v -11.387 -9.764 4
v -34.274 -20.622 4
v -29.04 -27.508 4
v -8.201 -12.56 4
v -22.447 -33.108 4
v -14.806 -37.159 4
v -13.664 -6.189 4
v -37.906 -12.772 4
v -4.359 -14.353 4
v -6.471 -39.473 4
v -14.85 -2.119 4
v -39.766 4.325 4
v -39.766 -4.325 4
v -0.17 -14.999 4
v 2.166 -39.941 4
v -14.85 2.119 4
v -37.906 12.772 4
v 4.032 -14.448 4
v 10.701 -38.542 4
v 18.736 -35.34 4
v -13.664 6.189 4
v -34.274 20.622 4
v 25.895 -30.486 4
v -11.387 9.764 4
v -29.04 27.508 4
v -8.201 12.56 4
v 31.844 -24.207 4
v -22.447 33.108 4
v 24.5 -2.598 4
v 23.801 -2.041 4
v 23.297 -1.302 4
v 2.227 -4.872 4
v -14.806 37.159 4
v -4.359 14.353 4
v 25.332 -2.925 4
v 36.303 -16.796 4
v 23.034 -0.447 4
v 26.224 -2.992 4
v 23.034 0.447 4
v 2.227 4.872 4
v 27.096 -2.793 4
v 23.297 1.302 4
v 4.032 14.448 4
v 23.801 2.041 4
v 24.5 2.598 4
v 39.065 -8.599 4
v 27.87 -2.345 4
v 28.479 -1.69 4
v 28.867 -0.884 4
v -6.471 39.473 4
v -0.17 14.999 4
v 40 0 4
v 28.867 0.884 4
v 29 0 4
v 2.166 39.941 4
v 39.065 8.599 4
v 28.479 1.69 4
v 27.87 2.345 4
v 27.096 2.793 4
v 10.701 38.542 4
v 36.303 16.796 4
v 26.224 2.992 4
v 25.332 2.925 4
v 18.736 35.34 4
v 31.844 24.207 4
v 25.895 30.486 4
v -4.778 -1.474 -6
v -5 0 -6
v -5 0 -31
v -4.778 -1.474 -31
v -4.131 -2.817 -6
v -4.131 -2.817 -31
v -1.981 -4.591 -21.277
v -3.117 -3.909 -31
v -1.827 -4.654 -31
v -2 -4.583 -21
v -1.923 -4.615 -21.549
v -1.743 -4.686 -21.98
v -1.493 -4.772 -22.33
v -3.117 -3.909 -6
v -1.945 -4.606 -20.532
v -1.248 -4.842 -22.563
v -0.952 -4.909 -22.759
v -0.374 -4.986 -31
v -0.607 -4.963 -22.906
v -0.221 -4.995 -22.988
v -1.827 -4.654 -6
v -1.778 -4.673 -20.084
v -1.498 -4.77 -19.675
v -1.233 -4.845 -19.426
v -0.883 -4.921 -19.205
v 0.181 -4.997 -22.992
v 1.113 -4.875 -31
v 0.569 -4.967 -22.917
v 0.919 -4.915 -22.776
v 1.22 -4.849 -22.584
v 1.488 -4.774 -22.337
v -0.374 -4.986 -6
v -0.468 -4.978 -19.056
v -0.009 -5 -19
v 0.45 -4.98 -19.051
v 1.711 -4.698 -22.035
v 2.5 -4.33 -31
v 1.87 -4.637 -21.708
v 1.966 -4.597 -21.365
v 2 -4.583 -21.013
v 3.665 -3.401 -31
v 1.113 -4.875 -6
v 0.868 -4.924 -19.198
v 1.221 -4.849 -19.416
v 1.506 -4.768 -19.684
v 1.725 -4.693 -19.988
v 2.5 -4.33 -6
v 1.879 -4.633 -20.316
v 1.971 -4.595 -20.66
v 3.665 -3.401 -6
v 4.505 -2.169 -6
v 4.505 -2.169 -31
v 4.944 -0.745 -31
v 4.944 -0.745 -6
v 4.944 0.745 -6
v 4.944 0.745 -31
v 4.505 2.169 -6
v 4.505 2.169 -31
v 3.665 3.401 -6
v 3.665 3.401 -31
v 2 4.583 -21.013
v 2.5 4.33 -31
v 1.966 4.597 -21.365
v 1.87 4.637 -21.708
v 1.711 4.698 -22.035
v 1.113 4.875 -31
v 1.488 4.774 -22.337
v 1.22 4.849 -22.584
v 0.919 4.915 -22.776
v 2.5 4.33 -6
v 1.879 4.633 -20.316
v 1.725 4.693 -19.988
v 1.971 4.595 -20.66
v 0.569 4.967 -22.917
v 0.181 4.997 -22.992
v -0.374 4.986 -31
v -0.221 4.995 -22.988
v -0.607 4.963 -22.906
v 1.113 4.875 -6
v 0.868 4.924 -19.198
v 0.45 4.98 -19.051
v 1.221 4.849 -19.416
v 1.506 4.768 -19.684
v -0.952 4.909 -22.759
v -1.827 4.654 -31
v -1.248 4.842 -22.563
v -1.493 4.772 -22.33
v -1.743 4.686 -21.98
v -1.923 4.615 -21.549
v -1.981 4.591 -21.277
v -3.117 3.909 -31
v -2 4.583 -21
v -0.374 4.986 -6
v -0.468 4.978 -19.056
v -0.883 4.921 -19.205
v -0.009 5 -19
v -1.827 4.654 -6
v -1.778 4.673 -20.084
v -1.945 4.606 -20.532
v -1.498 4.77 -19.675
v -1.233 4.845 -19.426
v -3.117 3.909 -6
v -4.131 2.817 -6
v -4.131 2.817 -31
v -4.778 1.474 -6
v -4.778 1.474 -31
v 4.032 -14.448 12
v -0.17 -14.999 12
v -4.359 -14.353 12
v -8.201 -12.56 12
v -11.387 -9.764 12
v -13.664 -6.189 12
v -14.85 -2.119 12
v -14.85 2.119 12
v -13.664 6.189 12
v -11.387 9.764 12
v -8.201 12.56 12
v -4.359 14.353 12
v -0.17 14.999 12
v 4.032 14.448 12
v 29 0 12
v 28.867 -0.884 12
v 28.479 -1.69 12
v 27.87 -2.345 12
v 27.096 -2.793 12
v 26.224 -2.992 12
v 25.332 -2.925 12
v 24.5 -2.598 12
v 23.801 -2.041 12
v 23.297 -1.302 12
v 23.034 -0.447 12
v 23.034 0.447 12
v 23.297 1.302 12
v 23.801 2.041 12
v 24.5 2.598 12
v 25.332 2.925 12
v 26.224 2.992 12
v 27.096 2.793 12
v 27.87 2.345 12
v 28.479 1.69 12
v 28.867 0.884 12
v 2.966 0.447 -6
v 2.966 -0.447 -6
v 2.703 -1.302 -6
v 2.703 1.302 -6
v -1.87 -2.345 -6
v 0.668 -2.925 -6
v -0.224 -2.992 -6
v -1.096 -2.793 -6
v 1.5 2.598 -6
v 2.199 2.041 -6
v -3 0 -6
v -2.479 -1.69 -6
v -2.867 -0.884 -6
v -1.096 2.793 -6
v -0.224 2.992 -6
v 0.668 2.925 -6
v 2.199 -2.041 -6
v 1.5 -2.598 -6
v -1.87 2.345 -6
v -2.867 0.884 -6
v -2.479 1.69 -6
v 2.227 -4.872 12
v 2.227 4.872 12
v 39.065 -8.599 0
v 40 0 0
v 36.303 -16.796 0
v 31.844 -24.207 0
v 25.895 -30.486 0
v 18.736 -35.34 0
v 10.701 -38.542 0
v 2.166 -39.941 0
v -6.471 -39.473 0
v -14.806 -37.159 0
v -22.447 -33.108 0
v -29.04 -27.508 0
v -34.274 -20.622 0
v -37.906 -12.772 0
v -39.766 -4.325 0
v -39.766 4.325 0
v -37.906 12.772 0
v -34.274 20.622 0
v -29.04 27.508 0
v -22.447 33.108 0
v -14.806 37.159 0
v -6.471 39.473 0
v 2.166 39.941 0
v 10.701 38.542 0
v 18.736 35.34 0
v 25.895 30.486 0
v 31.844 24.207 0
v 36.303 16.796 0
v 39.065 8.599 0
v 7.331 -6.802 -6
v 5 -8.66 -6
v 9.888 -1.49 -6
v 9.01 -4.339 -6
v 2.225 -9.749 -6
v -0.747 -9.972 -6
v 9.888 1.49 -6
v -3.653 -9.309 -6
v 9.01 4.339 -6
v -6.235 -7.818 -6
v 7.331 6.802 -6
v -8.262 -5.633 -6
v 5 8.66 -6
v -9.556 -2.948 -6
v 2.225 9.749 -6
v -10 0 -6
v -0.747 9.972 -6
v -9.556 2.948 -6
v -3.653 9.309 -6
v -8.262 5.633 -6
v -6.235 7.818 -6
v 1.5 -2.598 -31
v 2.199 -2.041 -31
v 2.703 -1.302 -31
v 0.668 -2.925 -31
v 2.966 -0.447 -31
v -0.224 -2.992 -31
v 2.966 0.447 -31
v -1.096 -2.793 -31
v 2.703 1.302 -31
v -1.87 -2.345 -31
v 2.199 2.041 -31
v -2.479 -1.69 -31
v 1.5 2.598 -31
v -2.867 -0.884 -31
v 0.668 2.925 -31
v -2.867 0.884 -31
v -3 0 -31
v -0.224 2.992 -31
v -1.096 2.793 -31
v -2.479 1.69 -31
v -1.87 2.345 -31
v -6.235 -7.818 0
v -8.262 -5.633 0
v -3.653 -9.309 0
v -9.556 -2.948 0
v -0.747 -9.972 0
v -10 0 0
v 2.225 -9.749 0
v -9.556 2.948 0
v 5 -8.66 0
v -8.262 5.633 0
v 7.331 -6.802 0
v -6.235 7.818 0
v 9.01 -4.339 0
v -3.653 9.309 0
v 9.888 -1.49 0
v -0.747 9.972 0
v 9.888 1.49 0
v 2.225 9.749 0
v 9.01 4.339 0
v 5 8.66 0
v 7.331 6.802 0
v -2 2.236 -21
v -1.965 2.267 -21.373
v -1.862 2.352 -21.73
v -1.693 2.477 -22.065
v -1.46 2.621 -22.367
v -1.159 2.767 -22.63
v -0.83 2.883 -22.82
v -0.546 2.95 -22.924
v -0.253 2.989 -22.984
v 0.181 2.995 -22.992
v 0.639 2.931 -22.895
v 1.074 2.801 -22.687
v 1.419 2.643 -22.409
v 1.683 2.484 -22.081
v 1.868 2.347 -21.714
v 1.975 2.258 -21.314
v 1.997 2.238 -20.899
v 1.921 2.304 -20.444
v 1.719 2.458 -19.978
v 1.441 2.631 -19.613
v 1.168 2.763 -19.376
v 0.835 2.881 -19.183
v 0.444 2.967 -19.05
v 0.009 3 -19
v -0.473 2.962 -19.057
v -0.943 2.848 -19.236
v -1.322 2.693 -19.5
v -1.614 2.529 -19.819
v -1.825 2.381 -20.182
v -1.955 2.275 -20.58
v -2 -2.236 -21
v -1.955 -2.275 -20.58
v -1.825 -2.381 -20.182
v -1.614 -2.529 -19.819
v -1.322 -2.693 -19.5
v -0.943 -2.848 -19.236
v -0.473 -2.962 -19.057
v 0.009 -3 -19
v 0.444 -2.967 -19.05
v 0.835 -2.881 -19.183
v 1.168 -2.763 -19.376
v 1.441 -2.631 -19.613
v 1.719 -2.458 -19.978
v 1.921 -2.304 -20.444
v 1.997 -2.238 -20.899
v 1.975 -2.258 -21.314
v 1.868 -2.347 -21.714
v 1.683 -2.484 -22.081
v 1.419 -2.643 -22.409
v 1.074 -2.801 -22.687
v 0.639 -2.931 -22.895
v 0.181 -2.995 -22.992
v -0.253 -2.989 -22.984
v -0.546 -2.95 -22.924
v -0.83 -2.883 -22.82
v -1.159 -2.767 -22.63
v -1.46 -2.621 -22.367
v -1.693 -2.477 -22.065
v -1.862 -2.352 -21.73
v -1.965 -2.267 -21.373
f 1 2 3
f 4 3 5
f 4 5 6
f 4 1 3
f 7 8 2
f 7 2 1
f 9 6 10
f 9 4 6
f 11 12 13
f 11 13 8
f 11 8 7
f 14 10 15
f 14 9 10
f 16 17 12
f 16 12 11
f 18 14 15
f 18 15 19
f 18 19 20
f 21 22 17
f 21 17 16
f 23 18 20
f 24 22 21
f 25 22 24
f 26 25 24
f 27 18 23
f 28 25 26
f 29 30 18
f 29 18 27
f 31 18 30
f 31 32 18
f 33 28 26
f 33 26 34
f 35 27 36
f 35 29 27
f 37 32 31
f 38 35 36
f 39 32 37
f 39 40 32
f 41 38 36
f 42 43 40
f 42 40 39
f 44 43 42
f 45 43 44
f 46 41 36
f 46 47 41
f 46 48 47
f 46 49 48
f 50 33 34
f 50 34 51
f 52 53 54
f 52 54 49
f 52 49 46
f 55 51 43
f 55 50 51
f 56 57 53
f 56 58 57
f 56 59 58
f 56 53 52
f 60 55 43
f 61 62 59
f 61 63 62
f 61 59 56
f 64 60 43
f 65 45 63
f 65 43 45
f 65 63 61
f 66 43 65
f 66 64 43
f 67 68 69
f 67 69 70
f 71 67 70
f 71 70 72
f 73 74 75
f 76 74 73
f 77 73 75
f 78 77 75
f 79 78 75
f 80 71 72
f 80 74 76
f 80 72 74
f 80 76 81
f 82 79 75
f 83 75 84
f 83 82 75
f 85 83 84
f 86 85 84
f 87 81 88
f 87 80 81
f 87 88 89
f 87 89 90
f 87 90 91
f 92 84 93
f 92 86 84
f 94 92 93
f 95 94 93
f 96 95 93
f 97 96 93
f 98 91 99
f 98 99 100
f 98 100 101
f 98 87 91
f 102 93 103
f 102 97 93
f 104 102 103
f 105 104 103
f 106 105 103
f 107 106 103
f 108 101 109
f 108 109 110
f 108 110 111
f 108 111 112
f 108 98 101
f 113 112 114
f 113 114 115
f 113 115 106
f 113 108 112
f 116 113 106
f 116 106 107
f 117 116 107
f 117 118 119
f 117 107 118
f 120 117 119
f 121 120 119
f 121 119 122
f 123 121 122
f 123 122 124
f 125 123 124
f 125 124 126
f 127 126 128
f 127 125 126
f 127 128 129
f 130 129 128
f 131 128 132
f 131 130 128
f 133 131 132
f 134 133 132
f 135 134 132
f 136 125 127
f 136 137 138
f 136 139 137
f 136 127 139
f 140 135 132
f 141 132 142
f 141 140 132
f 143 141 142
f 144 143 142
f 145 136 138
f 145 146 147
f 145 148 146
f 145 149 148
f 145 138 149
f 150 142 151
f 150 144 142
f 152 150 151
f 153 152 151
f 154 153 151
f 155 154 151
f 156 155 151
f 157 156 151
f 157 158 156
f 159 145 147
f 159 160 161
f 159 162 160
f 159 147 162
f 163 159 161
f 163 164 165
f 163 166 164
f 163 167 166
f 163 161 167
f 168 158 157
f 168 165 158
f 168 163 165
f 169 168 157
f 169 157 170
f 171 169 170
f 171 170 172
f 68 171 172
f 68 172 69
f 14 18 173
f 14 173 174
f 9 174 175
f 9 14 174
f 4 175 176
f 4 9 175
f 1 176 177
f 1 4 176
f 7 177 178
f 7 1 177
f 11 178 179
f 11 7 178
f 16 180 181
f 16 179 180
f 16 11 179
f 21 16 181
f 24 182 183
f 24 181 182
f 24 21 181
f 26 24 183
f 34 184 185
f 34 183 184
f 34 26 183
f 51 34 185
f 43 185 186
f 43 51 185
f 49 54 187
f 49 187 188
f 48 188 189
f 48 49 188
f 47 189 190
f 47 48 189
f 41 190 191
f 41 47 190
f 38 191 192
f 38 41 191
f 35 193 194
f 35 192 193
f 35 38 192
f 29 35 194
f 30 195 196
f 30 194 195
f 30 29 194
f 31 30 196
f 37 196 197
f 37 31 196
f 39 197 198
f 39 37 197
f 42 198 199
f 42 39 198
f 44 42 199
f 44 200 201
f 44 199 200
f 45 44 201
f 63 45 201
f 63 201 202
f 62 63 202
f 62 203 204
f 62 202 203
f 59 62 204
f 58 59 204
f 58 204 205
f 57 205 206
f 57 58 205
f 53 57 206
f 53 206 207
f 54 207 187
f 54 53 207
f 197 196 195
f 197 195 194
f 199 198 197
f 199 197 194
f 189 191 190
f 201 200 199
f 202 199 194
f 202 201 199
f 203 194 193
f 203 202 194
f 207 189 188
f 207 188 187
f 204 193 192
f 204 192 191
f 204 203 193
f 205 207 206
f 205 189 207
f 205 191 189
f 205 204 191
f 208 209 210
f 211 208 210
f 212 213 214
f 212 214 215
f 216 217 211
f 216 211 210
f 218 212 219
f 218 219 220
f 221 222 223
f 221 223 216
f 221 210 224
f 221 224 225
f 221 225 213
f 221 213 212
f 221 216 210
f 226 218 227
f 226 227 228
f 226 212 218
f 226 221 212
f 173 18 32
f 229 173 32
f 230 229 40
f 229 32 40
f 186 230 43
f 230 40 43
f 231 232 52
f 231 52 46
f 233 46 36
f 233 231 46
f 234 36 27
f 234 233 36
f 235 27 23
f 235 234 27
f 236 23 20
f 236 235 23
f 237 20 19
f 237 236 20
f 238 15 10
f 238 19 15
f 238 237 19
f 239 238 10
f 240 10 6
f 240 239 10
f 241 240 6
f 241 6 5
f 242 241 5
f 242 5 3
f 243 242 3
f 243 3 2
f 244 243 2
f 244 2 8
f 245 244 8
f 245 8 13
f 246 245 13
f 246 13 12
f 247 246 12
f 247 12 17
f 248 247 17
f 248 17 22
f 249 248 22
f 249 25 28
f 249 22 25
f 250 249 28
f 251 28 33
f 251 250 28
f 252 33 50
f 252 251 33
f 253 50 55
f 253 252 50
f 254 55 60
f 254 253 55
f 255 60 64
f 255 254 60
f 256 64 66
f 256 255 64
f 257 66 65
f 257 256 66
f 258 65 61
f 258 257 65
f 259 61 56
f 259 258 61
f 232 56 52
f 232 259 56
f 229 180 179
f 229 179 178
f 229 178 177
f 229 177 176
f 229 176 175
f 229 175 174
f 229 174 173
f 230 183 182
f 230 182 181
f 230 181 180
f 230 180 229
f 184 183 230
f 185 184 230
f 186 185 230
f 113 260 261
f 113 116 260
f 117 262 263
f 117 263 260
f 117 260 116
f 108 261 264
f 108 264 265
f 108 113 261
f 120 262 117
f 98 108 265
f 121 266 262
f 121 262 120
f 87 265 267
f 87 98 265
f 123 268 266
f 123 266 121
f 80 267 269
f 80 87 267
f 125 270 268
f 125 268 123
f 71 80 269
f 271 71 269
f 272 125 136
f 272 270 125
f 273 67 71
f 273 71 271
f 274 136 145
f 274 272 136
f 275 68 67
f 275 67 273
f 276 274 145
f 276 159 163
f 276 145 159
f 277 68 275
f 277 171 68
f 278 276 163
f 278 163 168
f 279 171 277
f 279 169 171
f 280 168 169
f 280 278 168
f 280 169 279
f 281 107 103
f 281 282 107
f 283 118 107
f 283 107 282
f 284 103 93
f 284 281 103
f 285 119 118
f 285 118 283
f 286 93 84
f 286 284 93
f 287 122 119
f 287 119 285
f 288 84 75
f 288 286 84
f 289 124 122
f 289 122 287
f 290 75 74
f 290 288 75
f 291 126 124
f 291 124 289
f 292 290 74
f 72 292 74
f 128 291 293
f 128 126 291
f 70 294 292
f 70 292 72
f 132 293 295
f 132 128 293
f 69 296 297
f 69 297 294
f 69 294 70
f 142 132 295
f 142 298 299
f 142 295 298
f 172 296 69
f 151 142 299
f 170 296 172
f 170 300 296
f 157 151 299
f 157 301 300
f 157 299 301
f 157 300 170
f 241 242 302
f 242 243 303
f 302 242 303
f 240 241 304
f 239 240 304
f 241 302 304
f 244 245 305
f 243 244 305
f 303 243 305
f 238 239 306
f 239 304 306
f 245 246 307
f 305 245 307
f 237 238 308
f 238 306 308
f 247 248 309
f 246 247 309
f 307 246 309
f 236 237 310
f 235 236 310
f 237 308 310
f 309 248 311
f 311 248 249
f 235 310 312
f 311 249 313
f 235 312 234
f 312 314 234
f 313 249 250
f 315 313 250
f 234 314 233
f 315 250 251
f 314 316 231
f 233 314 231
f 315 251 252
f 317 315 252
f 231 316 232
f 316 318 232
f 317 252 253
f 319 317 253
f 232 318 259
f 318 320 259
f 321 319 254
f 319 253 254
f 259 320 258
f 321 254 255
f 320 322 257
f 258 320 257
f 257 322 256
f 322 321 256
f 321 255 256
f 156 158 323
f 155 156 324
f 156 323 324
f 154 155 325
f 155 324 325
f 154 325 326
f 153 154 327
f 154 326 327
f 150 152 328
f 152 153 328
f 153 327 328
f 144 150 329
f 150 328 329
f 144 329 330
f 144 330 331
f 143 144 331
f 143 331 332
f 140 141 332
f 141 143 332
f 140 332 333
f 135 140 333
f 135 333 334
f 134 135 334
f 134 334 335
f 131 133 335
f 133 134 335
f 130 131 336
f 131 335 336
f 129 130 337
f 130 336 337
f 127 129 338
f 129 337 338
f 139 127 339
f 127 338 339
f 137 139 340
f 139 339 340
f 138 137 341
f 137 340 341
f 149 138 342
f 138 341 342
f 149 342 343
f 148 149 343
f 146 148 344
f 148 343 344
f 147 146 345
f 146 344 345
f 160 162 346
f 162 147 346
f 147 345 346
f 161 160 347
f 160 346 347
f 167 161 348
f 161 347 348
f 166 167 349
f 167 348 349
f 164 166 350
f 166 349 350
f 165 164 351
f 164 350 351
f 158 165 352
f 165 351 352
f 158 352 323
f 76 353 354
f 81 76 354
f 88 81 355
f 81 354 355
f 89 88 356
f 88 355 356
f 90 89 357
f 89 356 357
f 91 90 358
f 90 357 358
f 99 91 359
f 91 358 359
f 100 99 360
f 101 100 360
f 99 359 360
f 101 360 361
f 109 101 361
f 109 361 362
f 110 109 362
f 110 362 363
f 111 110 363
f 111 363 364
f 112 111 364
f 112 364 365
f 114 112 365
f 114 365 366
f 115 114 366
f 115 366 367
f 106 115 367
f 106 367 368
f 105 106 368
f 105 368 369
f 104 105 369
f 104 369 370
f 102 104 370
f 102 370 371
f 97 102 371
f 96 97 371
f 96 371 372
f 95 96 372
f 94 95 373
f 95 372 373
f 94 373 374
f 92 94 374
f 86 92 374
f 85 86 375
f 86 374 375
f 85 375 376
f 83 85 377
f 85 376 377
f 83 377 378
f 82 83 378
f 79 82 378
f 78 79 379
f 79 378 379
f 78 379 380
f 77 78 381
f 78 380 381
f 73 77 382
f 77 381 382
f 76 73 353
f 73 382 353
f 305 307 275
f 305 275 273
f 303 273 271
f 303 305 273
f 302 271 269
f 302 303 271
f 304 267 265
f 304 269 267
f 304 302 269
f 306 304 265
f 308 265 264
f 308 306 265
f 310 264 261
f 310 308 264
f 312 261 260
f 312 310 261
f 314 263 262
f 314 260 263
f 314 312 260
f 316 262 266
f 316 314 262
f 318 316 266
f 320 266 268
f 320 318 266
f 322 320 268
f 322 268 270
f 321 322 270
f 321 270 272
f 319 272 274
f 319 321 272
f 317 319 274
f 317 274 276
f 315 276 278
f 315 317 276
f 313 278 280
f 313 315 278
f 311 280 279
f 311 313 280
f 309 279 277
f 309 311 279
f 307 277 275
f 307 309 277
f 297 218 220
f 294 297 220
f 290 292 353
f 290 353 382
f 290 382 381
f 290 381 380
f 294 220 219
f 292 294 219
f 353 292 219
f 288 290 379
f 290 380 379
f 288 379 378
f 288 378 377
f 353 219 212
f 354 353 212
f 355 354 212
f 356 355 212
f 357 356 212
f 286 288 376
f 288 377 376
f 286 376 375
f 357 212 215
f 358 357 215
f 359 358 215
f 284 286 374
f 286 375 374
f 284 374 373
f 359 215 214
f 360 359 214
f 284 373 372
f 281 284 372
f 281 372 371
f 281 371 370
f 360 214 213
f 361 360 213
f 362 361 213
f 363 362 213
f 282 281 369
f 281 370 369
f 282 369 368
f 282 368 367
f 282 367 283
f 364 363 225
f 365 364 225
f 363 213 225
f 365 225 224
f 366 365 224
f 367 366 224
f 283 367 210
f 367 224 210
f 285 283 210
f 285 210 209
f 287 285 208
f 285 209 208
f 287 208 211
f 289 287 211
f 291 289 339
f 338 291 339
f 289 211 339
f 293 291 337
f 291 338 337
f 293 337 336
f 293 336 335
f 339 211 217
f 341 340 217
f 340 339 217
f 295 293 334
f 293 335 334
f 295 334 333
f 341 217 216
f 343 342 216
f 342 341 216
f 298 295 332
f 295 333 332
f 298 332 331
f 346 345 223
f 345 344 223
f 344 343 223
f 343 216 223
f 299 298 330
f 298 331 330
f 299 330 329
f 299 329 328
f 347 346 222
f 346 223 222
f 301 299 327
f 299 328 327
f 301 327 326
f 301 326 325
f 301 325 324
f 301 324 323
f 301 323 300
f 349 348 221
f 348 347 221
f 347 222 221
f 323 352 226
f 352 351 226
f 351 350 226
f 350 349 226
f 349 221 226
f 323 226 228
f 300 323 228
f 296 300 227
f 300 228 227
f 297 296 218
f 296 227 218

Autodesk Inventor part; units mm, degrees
ref_plane "YZ Plane" through (0, 0, 0) normal (1, 0, 0) x (0, 1, 0)
ref_plane "XZ Plane" through (0, 0, 0) normal (0, 1, 0) x (-1, 0, 0)
ref_plane "XY Plane" through (0, 0, 0) normal (0, 0, 1) x (1, 0, 0)
sketch "Sketch1" plane through (0, 0, 0) normal (0, 0, 1) x (1, 0, 0)
  circle A0 centre (0, 0) radius 40
  dimension "d0" = 40
extrude "Extrusion1" add sketch "Sketch1" along normal blind 4
sketch "Sketch2" plane through (0, 0, 4) normal (0, 0, 1) x (1, 0, 0)
  arc A0 (4.0325, 14.4478) -> (4.0325, -14.4478) centre (0, 0) ccw
  arc A1 (4.0325, 14.4478) -> (4.0325, -14.4478) centre (54.3652, 0) ccw
  dimension "d3" = 15
extrude "Extrusion2" add sketch "Sketch2" along normal blind 8
sketch "Sketch3" plane through (0, 0, 4) normal (0, 0, 1) x (1, 0, 0)
  circle A0 centre (26, 0) radius 3
  point P0 (0, 0)
  dimension "d6" = 3
sketch "Sketch4" plane through (0, 0, 0) normal (0, 0, -1) x (-1, 0, 0)
  circle A0 centre (0, 0) radius 10
  dimension "d9" = 10
extrude "Extrusion4" add sketch "Sketch4" along normal blind 6
sketch "Sketch5" plane through (0, 0, -6) normal (0, 0, -1) x (-1, 0, 0)
  circle A0 centre (0, 0) radius 5
  circle A1 centre (0, 0) radius 3
  dimension "d12" = 5
  dimension "d13" = 3
extrude "Extrusion5" add sketch "Sketch5" along normal blind 25
sketch "Sketch6" plane through (0, 0, 0) normal (0, 1, 0) x (-1, 0, 0)
  circle A0 centre (0, -21) radius 2
  point P0 (0, 0)
  dimension "d16" = 2
extrude "Extrusion6" cut sketch "Sketch6" along normal mid plane 25
extrude "Extrusion7" add sketch "Sketch3" along normal blind 8
properties part number "driverwheel"
